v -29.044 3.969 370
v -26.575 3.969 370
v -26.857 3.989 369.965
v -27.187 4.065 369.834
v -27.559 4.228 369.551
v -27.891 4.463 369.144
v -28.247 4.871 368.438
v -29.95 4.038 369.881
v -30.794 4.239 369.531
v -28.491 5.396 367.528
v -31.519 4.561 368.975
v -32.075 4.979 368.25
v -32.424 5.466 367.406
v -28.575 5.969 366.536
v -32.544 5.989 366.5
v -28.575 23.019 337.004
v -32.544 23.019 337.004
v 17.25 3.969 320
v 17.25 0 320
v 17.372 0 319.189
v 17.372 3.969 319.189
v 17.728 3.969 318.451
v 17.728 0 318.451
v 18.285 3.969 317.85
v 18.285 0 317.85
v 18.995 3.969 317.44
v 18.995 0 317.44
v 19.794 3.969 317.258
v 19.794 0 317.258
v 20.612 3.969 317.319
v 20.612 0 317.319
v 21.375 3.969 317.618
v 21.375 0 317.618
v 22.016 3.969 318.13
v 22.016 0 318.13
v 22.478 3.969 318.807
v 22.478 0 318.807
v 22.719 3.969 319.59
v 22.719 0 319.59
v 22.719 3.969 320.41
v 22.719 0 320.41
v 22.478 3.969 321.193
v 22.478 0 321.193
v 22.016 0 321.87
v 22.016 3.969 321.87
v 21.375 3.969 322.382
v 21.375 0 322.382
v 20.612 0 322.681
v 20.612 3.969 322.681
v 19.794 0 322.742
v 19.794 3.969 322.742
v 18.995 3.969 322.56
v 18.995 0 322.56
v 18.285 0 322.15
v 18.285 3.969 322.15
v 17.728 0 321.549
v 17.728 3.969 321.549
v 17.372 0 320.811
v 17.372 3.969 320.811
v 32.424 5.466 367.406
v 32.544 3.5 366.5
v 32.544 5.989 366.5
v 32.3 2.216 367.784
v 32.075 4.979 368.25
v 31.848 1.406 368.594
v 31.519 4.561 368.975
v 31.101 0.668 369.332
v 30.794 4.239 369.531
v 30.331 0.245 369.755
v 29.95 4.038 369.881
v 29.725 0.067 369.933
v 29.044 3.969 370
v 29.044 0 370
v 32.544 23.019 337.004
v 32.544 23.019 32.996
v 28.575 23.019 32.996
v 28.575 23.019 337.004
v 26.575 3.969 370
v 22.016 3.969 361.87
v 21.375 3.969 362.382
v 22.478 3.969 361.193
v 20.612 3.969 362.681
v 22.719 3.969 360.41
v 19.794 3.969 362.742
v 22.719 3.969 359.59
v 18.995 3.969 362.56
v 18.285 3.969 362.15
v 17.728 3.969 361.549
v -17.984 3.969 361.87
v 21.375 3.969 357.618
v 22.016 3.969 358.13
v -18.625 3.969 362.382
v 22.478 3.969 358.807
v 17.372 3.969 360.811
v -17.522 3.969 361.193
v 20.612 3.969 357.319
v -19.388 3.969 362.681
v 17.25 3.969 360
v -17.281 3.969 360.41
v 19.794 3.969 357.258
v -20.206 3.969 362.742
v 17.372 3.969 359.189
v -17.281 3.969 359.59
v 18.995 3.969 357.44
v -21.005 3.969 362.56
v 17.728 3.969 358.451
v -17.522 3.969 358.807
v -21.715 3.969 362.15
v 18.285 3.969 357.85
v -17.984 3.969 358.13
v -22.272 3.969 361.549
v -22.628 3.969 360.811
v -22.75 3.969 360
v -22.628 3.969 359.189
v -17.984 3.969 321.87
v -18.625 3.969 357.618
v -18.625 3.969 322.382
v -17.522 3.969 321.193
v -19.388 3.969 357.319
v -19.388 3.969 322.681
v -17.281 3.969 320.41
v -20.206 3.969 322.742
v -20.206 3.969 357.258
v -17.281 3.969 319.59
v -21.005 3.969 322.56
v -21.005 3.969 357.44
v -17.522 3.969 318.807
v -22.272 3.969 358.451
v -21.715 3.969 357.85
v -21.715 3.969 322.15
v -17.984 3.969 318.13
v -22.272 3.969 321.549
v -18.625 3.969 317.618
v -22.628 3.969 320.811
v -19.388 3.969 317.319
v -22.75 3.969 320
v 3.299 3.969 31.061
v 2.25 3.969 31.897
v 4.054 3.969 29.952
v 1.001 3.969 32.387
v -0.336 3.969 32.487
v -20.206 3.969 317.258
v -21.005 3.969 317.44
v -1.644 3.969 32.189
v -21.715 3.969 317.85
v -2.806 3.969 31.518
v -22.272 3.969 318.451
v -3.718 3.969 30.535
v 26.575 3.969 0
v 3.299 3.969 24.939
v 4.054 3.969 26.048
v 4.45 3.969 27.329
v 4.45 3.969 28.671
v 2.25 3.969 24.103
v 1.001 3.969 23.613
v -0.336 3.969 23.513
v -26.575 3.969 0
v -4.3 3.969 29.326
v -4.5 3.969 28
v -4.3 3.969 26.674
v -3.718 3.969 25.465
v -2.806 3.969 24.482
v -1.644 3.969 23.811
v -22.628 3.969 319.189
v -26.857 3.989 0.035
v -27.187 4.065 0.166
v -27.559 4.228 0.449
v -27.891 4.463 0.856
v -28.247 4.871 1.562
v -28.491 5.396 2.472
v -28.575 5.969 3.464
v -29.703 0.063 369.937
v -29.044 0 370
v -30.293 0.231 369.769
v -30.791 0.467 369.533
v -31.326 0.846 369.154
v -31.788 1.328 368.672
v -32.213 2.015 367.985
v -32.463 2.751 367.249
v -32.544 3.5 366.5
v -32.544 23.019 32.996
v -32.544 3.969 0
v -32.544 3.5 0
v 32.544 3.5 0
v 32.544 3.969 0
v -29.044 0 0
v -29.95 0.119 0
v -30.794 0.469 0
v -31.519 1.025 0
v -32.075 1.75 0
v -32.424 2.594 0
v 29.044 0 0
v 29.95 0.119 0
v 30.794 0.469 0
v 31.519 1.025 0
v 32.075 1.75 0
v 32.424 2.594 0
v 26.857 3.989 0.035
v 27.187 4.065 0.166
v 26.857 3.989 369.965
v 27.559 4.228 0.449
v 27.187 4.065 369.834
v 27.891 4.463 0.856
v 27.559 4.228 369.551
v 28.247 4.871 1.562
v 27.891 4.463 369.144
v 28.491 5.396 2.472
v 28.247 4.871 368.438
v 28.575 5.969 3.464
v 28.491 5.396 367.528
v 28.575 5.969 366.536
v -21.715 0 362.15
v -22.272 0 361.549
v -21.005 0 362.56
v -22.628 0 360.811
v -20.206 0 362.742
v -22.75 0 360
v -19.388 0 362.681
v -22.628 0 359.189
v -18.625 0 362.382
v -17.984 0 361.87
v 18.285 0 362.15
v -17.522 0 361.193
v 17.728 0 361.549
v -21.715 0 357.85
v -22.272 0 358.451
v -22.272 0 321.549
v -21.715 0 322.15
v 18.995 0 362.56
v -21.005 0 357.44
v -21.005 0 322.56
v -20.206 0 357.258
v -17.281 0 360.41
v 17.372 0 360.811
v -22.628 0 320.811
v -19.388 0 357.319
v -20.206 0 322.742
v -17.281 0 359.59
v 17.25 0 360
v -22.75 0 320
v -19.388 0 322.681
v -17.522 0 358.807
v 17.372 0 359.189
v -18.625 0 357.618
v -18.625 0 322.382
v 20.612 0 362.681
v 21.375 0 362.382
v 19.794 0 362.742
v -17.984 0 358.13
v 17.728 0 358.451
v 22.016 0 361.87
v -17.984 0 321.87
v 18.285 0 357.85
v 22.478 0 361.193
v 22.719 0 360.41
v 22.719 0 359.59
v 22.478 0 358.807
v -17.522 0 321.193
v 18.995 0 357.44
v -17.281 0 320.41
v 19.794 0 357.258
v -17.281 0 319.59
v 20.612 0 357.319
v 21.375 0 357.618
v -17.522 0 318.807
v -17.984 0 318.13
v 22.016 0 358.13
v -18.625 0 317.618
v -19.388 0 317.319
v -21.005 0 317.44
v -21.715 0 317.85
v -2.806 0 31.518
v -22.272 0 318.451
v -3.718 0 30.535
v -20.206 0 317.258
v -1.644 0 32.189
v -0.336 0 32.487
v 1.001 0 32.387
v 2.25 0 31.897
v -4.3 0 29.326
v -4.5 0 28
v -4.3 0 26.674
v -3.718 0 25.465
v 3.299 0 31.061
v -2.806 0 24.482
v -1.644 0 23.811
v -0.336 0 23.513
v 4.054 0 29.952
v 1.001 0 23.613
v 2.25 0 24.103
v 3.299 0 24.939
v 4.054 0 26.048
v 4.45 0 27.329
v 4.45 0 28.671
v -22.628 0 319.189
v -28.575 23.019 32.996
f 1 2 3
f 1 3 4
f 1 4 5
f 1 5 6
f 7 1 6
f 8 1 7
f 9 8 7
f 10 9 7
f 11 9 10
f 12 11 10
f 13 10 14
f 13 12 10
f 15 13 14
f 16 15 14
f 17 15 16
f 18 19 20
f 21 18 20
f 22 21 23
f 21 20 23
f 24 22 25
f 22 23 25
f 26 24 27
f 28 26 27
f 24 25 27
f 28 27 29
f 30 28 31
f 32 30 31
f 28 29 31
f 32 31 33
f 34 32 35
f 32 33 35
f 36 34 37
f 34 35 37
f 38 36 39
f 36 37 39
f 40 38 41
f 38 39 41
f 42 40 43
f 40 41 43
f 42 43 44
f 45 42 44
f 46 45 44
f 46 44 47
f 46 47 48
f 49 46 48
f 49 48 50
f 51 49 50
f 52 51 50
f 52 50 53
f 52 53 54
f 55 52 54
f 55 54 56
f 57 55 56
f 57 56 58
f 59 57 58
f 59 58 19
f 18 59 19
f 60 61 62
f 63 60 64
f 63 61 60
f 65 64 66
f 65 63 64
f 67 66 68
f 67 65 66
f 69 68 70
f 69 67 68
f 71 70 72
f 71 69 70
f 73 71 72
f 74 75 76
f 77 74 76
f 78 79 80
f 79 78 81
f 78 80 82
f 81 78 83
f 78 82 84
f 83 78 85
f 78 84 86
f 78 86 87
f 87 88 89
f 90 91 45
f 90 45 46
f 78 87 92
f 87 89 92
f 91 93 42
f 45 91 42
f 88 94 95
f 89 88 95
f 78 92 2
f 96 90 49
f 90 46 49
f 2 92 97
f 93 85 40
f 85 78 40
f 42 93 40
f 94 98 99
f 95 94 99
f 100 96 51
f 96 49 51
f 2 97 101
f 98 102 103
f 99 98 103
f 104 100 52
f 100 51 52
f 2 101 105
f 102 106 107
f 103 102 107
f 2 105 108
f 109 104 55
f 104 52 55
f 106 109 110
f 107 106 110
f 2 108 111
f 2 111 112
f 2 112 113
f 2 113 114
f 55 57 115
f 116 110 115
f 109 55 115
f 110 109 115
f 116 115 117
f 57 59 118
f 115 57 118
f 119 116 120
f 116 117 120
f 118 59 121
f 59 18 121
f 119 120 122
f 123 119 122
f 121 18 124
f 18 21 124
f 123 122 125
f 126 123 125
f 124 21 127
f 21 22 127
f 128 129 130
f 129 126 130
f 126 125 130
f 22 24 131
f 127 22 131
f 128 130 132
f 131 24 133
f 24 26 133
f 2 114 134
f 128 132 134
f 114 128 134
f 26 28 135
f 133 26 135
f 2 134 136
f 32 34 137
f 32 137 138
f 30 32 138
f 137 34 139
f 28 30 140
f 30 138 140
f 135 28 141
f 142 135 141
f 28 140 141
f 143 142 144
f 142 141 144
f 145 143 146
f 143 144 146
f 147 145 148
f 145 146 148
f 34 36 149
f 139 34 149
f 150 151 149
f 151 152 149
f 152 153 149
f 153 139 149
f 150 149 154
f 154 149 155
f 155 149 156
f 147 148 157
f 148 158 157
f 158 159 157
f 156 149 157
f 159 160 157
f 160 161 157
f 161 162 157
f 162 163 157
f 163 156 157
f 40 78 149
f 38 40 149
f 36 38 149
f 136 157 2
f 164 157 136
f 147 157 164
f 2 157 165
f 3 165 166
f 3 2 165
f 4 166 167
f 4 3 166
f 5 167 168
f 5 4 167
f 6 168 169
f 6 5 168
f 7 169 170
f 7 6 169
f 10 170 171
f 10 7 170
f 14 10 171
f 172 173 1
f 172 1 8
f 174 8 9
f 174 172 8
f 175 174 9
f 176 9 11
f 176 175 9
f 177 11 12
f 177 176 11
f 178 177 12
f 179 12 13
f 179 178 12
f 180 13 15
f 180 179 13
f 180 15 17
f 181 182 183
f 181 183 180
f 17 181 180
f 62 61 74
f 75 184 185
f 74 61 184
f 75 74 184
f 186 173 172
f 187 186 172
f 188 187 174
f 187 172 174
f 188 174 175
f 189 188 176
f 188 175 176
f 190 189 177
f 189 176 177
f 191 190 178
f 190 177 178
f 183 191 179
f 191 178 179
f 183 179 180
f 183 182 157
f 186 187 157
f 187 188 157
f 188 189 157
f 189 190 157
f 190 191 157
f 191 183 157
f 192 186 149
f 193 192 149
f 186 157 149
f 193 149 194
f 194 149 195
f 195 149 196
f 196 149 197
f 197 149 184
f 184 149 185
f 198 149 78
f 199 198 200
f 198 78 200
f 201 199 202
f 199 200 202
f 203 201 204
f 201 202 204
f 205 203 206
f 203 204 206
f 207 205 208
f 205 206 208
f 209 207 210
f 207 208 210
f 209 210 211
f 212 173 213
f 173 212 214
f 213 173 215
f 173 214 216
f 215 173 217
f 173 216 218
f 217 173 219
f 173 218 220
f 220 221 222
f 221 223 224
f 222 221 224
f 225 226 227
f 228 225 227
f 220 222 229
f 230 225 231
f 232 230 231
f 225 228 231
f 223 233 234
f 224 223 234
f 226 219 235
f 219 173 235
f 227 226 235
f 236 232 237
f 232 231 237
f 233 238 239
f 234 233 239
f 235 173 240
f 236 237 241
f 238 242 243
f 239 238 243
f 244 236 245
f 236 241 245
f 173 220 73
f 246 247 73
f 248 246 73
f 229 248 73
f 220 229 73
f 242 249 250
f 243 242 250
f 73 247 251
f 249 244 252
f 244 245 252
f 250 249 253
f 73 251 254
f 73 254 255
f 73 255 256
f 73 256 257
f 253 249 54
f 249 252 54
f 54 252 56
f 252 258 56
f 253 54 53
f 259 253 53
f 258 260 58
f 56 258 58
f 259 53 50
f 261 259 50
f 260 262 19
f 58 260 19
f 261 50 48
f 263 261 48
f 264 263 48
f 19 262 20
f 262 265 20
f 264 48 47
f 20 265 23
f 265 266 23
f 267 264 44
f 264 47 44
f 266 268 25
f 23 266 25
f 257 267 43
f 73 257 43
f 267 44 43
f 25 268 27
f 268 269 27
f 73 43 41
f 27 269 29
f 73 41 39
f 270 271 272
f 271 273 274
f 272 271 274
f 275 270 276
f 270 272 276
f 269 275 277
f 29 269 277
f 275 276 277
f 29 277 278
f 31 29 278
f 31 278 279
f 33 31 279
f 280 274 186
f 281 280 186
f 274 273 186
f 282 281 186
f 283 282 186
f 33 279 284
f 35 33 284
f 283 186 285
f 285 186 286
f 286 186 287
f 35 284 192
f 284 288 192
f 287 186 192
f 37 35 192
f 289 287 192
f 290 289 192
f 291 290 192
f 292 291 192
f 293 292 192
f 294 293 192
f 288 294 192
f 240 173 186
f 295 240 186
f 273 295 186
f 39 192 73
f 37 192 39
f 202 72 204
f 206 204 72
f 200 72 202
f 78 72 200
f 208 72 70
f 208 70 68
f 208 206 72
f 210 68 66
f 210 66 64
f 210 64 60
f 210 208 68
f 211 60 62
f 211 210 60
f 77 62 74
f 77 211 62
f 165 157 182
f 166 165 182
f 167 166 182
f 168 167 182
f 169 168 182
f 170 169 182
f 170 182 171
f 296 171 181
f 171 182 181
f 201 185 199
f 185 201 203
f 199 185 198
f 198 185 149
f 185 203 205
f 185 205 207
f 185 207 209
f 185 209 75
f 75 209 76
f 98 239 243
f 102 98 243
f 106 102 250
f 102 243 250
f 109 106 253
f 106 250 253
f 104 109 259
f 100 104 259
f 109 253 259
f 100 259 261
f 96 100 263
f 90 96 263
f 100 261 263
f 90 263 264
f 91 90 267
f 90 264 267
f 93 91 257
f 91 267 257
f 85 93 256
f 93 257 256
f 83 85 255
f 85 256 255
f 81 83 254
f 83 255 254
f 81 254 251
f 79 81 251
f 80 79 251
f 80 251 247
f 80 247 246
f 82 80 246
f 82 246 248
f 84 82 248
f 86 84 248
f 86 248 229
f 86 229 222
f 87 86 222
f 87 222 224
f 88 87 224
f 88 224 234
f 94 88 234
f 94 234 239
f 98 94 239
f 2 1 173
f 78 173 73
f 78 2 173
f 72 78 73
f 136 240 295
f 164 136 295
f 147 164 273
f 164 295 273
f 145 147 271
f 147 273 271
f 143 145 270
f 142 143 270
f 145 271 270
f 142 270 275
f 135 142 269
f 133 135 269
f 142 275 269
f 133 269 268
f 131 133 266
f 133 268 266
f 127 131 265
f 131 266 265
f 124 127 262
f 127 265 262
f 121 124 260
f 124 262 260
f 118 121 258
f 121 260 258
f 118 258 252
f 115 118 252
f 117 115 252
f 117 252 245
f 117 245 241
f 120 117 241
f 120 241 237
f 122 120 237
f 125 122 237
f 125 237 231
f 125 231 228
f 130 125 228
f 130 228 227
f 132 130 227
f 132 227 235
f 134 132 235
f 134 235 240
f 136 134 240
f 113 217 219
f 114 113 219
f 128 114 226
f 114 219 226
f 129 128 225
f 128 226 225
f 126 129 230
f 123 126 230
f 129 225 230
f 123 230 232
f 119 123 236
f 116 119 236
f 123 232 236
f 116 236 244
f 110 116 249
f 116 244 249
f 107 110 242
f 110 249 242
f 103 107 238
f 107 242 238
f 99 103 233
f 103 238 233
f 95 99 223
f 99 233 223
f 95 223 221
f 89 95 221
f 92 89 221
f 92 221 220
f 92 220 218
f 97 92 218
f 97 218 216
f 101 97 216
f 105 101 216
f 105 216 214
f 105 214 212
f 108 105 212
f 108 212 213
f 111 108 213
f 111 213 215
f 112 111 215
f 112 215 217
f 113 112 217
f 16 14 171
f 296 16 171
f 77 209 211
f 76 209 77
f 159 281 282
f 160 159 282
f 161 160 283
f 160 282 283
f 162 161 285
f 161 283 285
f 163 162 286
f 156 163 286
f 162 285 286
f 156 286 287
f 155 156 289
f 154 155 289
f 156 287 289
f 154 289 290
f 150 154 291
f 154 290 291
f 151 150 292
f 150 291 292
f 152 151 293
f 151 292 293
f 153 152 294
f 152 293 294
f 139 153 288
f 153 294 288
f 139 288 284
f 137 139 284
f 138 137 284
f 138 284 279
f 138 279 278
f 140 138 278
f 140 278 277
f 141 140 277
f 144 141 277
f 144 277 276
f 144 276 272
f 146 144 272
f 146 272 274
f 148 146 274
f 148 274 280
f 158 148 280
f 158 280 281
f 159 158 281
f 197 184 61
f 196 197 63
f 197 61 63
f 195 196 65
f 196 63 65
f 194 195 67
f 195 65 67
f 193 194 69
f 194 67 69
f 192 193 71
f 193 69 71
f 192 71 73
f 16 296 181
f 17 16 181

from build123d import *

# Parameters (mm, degrees)
BOSS_EXTRUDE1_DEPTH  = 370
CUT_EXTRUDE1_DEPTH   = 377.385766877
M5_CLEARANCE_HOLE1_D = 5.5
M8_CLEARANCE_HOLE1_D = 9
FILLET1_R            = 2
FILLET2_R            = 3.5
CUT_EXTRUDE2_DEPTH   = 373.141046534


with BuildPart() as part:
    # Sketch1 → Boss-Extrude1 (new body)
    with BuildSketch(Plane.XY):
        Polygon((-28.575, 23.01875), (-32.54375, 23.01875), (-32.54375, 0), (32.54375, 0), (32.54375, 23.01875), (28.575, 23.01875), (28.575, 3.96875), (-28.575, 3.96875), align=None)
    extrude(amount=BOSS_EXTRUDE1_DEPTH)

    # Sketch2 → Cut-Extrude1 (cut, through all)
    with BuildSketch(Plane.ZY.offset(32.54375)):
        Polygon((0, 3.96875), (32.995567884, 23.01875), (0, 23.01875), align=None)
        Polygon((370, 23.01875), (370, 3.96875), (337.004432116, 23.01875), align=None)
    extrude(amount=-CUT_EXTRUDE1_DEPTH, mode=Mode.SUBTRACT)

    # M5 Clearance Hole1 (through all)
    with Locations(Plane(origin=(0, 3.96875, 0), x_dir=(1, 0, 0), z_dir=(0, 1, 0))):
        with Locations((20, -360), (20, -320), (-20, -320), (-20, -360)):
            Hole(M5_CLEARANCE_HOLE1_D / 2)

    # M8 Clearance Hole1 (through all)
    with Locations(Plane(origin=(0, 3.96875, 0), x_dir=(1, 0, 0), z_dir=(0, 1, 0))):
        with Locations((0, -28)):
            Hole(M8_CLEARANCE_HOLE1_D / 2)

    # Fillet1
    fillet1_edges = [part.edges().sort_by_distance(p)[0] for p in [
        (28.575, 3.96875, 185),
        (-28.575, 3.96875, 185),
    ]]
    fillet(fillet1_edges, radius=FILLET1_R)

    # Fillet2
    fillet2_edges = [part.edges().sort_by_distance(p)[0] for p in [
        (32.54375, 0, 185),
        (-32.54375, 0, 185),
    ]]
    fillet(fillet2_edges, radius=FILLET2_R)

    # Sketch8 → Cut-Extrude2 (cut, through all)
    with BuildSketch(Plane.XZ):
        with BuildLine():
            Line((-32.54375, 366.5), (-32.54375, 370))
            Line((-32.54375, 370), (-29.04375, 370))
            ThreePointArc((-29.04375, 370), (-31.518623734, 368.974873734), (-32.54375, 366.5))
        make_face()
        with BuildLine():
            Line((29.04375, 370), (32.54375, 370))
            Line((32.54375, 370), (32.54375, 366.5))
            ThreePointArc((32.54375, 366.5), (31.518623734, 368.974873734), (29.04375, 370))
        make_face()
    extrude(amount=-CUT_EXTRUDE2_DEPTH, mode=Mode.SUBTRACT)


solid = part.part
